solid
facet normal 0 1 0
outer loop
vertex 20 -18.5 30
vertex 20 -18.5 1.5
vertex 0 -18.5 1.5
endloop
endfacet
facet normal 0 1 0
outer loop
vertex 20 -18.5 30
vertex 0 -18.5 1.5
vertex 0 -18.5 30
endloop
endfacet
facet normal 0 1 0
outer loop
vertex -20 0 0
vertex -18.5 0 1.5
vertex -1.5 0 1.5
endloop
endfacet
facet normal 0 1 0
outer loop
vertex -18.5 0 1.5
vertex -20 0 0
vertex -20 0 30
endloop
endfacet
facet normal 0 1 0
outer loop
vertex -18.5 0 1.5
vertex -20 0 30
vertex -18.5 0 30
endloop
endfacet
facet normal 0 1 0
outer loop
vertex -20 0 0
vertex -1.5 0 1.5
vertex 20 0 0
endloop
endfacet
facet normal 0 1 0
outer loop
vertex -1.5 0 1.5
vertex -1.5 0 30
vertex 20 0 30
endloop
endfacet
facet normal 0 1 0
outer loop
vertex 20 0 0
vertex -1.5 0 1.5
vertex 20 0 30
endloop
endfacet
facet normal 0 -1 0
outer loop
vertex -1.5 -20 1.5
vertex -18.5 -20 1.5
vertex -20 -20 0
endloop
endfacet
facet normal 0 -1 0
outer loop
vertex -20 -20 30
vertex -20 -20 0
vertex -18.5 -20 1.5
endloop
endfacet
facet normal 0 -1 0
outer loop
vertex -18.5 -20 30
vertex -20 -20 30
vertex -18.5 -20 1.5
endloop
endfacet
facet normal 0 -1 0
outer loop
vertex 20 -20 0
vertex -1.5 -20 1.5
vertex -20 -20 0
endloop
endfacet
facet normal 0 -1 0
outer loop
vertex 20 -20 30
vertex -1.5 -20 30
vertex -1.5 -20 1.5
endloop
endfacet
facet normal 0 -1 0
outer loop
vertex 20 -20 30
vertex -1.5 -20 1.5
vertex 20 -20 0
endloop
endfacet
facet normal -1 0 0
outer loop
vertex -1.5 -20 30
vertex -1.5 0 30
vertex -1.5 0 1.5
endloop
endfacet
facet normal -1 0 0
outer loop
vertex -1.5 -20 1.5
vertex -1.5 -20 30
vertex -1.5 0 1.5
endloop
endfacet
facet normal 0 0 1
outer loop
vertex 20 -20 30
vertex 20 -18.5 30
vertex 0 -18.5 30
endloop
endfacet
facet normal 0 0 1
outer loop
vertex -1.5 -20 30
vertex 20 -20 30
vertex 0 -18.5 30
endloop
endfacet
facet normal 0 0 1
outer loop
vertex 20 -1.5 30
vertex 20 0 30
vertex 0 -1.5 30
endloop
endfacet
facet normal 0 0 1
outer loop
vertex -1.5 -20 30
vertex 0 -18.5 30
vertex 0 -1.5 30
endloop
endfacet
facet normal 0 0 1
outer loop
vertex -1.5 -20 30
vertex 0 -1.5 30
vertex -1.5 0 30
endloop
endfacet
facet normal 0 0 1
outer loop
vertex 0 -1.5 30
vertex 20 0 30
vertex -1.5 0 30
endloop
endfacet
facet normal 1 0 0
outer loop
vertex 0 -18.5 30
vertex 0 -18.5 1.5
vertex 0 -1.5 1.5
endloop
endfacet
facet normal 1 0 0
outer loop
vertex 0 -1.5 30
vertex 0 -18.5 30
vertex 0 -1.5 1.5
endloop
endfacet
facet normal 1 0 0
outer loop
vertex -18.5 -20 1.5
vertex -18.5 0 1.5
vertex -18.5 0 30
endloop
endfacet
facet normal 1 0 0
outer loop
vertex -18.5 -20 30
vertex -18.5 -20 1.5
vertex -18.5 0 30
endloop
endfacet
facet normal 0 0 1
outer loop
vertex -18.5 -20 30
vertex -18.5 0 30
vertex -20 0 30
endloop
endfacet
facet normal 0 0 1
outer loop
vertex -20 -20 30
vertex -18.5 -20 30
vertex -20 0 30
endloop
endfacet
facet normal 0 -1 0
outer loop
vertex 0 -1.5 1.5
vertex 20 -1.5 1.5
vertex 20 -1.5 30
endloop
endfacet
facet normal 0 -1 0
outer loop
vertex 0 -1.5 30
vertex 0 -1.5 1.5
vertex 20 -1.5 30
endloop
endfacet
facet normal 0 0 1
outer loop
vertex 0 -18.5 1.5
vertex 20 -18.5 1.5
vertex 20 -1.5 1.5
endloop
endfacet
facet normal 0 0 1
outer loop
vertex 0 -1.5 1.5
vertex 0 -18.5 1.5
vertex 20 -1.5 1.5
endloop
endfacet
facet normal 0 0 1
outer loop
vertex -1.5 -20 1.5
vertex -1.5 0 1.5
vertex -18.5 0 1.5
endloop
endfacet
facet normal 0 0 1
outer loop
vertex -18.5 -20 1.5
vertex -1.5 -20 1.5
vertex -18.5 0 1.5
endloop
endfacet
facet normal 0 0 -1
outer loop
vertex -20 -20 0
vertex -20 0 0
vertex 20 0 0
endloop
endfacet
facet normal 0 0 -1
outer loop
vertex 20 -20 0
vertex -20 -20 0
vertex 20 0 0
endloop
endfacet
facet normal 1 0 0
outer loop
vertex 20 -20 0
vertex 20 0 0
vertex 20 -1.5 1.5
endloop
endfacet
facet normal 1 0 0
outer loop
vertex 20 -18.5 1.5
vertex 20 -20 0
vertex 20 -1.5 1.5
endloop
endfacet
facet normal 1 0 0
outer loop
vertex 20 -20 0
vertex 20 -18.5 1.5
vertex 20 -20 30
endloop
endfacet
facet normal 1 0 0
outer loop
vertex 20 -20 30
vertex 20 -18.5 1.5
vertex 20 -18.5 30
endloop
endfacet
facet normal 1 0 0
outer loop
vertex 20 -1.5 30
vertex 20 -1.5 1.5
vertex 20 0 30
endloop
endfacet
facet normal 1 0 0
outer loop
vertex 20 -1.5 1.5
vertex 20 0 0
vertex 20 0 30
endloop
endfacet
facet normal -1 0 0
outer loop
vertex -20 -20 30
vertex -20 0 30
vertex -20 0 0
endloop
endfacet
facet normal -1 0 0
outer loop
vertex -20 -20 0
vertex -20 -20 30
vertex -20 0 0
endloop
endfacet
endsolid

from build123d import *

# Parameters (mm, degrees)
F0_W     = 20
F0_H     = 30
F1_DEPTH = 20
F3_W     = 17
F3_H     = 28.5
F4_DEPTH = 30


with BuildPart() as f1:
    # F0 (on Front) → F1 (new body)
    with BuildSketch(Plane.XZ):
        Polygon((-18.5, 30), (-20, 30), (-20, 0), (0, 0), (0, 30), (-1.5, 30), (-1.5, 1.5), (-18.5, 1.5), align=None)
        with Locations((10, 15)):
            Rectangle(F0_W, F0_H)
    extrude(amount=F1_DEPTH)

    # F3 (on offset) → F4 (cut)
    with BuildSketch(Plane.YZ.offset(30)):
        with Locations((-10, 15.75)):
            Rectangle(F3_W, F3_H)
    extrude(amount=-F4_DEPTH, mode=Mode.SUBTRACT)


solid = f1.part
